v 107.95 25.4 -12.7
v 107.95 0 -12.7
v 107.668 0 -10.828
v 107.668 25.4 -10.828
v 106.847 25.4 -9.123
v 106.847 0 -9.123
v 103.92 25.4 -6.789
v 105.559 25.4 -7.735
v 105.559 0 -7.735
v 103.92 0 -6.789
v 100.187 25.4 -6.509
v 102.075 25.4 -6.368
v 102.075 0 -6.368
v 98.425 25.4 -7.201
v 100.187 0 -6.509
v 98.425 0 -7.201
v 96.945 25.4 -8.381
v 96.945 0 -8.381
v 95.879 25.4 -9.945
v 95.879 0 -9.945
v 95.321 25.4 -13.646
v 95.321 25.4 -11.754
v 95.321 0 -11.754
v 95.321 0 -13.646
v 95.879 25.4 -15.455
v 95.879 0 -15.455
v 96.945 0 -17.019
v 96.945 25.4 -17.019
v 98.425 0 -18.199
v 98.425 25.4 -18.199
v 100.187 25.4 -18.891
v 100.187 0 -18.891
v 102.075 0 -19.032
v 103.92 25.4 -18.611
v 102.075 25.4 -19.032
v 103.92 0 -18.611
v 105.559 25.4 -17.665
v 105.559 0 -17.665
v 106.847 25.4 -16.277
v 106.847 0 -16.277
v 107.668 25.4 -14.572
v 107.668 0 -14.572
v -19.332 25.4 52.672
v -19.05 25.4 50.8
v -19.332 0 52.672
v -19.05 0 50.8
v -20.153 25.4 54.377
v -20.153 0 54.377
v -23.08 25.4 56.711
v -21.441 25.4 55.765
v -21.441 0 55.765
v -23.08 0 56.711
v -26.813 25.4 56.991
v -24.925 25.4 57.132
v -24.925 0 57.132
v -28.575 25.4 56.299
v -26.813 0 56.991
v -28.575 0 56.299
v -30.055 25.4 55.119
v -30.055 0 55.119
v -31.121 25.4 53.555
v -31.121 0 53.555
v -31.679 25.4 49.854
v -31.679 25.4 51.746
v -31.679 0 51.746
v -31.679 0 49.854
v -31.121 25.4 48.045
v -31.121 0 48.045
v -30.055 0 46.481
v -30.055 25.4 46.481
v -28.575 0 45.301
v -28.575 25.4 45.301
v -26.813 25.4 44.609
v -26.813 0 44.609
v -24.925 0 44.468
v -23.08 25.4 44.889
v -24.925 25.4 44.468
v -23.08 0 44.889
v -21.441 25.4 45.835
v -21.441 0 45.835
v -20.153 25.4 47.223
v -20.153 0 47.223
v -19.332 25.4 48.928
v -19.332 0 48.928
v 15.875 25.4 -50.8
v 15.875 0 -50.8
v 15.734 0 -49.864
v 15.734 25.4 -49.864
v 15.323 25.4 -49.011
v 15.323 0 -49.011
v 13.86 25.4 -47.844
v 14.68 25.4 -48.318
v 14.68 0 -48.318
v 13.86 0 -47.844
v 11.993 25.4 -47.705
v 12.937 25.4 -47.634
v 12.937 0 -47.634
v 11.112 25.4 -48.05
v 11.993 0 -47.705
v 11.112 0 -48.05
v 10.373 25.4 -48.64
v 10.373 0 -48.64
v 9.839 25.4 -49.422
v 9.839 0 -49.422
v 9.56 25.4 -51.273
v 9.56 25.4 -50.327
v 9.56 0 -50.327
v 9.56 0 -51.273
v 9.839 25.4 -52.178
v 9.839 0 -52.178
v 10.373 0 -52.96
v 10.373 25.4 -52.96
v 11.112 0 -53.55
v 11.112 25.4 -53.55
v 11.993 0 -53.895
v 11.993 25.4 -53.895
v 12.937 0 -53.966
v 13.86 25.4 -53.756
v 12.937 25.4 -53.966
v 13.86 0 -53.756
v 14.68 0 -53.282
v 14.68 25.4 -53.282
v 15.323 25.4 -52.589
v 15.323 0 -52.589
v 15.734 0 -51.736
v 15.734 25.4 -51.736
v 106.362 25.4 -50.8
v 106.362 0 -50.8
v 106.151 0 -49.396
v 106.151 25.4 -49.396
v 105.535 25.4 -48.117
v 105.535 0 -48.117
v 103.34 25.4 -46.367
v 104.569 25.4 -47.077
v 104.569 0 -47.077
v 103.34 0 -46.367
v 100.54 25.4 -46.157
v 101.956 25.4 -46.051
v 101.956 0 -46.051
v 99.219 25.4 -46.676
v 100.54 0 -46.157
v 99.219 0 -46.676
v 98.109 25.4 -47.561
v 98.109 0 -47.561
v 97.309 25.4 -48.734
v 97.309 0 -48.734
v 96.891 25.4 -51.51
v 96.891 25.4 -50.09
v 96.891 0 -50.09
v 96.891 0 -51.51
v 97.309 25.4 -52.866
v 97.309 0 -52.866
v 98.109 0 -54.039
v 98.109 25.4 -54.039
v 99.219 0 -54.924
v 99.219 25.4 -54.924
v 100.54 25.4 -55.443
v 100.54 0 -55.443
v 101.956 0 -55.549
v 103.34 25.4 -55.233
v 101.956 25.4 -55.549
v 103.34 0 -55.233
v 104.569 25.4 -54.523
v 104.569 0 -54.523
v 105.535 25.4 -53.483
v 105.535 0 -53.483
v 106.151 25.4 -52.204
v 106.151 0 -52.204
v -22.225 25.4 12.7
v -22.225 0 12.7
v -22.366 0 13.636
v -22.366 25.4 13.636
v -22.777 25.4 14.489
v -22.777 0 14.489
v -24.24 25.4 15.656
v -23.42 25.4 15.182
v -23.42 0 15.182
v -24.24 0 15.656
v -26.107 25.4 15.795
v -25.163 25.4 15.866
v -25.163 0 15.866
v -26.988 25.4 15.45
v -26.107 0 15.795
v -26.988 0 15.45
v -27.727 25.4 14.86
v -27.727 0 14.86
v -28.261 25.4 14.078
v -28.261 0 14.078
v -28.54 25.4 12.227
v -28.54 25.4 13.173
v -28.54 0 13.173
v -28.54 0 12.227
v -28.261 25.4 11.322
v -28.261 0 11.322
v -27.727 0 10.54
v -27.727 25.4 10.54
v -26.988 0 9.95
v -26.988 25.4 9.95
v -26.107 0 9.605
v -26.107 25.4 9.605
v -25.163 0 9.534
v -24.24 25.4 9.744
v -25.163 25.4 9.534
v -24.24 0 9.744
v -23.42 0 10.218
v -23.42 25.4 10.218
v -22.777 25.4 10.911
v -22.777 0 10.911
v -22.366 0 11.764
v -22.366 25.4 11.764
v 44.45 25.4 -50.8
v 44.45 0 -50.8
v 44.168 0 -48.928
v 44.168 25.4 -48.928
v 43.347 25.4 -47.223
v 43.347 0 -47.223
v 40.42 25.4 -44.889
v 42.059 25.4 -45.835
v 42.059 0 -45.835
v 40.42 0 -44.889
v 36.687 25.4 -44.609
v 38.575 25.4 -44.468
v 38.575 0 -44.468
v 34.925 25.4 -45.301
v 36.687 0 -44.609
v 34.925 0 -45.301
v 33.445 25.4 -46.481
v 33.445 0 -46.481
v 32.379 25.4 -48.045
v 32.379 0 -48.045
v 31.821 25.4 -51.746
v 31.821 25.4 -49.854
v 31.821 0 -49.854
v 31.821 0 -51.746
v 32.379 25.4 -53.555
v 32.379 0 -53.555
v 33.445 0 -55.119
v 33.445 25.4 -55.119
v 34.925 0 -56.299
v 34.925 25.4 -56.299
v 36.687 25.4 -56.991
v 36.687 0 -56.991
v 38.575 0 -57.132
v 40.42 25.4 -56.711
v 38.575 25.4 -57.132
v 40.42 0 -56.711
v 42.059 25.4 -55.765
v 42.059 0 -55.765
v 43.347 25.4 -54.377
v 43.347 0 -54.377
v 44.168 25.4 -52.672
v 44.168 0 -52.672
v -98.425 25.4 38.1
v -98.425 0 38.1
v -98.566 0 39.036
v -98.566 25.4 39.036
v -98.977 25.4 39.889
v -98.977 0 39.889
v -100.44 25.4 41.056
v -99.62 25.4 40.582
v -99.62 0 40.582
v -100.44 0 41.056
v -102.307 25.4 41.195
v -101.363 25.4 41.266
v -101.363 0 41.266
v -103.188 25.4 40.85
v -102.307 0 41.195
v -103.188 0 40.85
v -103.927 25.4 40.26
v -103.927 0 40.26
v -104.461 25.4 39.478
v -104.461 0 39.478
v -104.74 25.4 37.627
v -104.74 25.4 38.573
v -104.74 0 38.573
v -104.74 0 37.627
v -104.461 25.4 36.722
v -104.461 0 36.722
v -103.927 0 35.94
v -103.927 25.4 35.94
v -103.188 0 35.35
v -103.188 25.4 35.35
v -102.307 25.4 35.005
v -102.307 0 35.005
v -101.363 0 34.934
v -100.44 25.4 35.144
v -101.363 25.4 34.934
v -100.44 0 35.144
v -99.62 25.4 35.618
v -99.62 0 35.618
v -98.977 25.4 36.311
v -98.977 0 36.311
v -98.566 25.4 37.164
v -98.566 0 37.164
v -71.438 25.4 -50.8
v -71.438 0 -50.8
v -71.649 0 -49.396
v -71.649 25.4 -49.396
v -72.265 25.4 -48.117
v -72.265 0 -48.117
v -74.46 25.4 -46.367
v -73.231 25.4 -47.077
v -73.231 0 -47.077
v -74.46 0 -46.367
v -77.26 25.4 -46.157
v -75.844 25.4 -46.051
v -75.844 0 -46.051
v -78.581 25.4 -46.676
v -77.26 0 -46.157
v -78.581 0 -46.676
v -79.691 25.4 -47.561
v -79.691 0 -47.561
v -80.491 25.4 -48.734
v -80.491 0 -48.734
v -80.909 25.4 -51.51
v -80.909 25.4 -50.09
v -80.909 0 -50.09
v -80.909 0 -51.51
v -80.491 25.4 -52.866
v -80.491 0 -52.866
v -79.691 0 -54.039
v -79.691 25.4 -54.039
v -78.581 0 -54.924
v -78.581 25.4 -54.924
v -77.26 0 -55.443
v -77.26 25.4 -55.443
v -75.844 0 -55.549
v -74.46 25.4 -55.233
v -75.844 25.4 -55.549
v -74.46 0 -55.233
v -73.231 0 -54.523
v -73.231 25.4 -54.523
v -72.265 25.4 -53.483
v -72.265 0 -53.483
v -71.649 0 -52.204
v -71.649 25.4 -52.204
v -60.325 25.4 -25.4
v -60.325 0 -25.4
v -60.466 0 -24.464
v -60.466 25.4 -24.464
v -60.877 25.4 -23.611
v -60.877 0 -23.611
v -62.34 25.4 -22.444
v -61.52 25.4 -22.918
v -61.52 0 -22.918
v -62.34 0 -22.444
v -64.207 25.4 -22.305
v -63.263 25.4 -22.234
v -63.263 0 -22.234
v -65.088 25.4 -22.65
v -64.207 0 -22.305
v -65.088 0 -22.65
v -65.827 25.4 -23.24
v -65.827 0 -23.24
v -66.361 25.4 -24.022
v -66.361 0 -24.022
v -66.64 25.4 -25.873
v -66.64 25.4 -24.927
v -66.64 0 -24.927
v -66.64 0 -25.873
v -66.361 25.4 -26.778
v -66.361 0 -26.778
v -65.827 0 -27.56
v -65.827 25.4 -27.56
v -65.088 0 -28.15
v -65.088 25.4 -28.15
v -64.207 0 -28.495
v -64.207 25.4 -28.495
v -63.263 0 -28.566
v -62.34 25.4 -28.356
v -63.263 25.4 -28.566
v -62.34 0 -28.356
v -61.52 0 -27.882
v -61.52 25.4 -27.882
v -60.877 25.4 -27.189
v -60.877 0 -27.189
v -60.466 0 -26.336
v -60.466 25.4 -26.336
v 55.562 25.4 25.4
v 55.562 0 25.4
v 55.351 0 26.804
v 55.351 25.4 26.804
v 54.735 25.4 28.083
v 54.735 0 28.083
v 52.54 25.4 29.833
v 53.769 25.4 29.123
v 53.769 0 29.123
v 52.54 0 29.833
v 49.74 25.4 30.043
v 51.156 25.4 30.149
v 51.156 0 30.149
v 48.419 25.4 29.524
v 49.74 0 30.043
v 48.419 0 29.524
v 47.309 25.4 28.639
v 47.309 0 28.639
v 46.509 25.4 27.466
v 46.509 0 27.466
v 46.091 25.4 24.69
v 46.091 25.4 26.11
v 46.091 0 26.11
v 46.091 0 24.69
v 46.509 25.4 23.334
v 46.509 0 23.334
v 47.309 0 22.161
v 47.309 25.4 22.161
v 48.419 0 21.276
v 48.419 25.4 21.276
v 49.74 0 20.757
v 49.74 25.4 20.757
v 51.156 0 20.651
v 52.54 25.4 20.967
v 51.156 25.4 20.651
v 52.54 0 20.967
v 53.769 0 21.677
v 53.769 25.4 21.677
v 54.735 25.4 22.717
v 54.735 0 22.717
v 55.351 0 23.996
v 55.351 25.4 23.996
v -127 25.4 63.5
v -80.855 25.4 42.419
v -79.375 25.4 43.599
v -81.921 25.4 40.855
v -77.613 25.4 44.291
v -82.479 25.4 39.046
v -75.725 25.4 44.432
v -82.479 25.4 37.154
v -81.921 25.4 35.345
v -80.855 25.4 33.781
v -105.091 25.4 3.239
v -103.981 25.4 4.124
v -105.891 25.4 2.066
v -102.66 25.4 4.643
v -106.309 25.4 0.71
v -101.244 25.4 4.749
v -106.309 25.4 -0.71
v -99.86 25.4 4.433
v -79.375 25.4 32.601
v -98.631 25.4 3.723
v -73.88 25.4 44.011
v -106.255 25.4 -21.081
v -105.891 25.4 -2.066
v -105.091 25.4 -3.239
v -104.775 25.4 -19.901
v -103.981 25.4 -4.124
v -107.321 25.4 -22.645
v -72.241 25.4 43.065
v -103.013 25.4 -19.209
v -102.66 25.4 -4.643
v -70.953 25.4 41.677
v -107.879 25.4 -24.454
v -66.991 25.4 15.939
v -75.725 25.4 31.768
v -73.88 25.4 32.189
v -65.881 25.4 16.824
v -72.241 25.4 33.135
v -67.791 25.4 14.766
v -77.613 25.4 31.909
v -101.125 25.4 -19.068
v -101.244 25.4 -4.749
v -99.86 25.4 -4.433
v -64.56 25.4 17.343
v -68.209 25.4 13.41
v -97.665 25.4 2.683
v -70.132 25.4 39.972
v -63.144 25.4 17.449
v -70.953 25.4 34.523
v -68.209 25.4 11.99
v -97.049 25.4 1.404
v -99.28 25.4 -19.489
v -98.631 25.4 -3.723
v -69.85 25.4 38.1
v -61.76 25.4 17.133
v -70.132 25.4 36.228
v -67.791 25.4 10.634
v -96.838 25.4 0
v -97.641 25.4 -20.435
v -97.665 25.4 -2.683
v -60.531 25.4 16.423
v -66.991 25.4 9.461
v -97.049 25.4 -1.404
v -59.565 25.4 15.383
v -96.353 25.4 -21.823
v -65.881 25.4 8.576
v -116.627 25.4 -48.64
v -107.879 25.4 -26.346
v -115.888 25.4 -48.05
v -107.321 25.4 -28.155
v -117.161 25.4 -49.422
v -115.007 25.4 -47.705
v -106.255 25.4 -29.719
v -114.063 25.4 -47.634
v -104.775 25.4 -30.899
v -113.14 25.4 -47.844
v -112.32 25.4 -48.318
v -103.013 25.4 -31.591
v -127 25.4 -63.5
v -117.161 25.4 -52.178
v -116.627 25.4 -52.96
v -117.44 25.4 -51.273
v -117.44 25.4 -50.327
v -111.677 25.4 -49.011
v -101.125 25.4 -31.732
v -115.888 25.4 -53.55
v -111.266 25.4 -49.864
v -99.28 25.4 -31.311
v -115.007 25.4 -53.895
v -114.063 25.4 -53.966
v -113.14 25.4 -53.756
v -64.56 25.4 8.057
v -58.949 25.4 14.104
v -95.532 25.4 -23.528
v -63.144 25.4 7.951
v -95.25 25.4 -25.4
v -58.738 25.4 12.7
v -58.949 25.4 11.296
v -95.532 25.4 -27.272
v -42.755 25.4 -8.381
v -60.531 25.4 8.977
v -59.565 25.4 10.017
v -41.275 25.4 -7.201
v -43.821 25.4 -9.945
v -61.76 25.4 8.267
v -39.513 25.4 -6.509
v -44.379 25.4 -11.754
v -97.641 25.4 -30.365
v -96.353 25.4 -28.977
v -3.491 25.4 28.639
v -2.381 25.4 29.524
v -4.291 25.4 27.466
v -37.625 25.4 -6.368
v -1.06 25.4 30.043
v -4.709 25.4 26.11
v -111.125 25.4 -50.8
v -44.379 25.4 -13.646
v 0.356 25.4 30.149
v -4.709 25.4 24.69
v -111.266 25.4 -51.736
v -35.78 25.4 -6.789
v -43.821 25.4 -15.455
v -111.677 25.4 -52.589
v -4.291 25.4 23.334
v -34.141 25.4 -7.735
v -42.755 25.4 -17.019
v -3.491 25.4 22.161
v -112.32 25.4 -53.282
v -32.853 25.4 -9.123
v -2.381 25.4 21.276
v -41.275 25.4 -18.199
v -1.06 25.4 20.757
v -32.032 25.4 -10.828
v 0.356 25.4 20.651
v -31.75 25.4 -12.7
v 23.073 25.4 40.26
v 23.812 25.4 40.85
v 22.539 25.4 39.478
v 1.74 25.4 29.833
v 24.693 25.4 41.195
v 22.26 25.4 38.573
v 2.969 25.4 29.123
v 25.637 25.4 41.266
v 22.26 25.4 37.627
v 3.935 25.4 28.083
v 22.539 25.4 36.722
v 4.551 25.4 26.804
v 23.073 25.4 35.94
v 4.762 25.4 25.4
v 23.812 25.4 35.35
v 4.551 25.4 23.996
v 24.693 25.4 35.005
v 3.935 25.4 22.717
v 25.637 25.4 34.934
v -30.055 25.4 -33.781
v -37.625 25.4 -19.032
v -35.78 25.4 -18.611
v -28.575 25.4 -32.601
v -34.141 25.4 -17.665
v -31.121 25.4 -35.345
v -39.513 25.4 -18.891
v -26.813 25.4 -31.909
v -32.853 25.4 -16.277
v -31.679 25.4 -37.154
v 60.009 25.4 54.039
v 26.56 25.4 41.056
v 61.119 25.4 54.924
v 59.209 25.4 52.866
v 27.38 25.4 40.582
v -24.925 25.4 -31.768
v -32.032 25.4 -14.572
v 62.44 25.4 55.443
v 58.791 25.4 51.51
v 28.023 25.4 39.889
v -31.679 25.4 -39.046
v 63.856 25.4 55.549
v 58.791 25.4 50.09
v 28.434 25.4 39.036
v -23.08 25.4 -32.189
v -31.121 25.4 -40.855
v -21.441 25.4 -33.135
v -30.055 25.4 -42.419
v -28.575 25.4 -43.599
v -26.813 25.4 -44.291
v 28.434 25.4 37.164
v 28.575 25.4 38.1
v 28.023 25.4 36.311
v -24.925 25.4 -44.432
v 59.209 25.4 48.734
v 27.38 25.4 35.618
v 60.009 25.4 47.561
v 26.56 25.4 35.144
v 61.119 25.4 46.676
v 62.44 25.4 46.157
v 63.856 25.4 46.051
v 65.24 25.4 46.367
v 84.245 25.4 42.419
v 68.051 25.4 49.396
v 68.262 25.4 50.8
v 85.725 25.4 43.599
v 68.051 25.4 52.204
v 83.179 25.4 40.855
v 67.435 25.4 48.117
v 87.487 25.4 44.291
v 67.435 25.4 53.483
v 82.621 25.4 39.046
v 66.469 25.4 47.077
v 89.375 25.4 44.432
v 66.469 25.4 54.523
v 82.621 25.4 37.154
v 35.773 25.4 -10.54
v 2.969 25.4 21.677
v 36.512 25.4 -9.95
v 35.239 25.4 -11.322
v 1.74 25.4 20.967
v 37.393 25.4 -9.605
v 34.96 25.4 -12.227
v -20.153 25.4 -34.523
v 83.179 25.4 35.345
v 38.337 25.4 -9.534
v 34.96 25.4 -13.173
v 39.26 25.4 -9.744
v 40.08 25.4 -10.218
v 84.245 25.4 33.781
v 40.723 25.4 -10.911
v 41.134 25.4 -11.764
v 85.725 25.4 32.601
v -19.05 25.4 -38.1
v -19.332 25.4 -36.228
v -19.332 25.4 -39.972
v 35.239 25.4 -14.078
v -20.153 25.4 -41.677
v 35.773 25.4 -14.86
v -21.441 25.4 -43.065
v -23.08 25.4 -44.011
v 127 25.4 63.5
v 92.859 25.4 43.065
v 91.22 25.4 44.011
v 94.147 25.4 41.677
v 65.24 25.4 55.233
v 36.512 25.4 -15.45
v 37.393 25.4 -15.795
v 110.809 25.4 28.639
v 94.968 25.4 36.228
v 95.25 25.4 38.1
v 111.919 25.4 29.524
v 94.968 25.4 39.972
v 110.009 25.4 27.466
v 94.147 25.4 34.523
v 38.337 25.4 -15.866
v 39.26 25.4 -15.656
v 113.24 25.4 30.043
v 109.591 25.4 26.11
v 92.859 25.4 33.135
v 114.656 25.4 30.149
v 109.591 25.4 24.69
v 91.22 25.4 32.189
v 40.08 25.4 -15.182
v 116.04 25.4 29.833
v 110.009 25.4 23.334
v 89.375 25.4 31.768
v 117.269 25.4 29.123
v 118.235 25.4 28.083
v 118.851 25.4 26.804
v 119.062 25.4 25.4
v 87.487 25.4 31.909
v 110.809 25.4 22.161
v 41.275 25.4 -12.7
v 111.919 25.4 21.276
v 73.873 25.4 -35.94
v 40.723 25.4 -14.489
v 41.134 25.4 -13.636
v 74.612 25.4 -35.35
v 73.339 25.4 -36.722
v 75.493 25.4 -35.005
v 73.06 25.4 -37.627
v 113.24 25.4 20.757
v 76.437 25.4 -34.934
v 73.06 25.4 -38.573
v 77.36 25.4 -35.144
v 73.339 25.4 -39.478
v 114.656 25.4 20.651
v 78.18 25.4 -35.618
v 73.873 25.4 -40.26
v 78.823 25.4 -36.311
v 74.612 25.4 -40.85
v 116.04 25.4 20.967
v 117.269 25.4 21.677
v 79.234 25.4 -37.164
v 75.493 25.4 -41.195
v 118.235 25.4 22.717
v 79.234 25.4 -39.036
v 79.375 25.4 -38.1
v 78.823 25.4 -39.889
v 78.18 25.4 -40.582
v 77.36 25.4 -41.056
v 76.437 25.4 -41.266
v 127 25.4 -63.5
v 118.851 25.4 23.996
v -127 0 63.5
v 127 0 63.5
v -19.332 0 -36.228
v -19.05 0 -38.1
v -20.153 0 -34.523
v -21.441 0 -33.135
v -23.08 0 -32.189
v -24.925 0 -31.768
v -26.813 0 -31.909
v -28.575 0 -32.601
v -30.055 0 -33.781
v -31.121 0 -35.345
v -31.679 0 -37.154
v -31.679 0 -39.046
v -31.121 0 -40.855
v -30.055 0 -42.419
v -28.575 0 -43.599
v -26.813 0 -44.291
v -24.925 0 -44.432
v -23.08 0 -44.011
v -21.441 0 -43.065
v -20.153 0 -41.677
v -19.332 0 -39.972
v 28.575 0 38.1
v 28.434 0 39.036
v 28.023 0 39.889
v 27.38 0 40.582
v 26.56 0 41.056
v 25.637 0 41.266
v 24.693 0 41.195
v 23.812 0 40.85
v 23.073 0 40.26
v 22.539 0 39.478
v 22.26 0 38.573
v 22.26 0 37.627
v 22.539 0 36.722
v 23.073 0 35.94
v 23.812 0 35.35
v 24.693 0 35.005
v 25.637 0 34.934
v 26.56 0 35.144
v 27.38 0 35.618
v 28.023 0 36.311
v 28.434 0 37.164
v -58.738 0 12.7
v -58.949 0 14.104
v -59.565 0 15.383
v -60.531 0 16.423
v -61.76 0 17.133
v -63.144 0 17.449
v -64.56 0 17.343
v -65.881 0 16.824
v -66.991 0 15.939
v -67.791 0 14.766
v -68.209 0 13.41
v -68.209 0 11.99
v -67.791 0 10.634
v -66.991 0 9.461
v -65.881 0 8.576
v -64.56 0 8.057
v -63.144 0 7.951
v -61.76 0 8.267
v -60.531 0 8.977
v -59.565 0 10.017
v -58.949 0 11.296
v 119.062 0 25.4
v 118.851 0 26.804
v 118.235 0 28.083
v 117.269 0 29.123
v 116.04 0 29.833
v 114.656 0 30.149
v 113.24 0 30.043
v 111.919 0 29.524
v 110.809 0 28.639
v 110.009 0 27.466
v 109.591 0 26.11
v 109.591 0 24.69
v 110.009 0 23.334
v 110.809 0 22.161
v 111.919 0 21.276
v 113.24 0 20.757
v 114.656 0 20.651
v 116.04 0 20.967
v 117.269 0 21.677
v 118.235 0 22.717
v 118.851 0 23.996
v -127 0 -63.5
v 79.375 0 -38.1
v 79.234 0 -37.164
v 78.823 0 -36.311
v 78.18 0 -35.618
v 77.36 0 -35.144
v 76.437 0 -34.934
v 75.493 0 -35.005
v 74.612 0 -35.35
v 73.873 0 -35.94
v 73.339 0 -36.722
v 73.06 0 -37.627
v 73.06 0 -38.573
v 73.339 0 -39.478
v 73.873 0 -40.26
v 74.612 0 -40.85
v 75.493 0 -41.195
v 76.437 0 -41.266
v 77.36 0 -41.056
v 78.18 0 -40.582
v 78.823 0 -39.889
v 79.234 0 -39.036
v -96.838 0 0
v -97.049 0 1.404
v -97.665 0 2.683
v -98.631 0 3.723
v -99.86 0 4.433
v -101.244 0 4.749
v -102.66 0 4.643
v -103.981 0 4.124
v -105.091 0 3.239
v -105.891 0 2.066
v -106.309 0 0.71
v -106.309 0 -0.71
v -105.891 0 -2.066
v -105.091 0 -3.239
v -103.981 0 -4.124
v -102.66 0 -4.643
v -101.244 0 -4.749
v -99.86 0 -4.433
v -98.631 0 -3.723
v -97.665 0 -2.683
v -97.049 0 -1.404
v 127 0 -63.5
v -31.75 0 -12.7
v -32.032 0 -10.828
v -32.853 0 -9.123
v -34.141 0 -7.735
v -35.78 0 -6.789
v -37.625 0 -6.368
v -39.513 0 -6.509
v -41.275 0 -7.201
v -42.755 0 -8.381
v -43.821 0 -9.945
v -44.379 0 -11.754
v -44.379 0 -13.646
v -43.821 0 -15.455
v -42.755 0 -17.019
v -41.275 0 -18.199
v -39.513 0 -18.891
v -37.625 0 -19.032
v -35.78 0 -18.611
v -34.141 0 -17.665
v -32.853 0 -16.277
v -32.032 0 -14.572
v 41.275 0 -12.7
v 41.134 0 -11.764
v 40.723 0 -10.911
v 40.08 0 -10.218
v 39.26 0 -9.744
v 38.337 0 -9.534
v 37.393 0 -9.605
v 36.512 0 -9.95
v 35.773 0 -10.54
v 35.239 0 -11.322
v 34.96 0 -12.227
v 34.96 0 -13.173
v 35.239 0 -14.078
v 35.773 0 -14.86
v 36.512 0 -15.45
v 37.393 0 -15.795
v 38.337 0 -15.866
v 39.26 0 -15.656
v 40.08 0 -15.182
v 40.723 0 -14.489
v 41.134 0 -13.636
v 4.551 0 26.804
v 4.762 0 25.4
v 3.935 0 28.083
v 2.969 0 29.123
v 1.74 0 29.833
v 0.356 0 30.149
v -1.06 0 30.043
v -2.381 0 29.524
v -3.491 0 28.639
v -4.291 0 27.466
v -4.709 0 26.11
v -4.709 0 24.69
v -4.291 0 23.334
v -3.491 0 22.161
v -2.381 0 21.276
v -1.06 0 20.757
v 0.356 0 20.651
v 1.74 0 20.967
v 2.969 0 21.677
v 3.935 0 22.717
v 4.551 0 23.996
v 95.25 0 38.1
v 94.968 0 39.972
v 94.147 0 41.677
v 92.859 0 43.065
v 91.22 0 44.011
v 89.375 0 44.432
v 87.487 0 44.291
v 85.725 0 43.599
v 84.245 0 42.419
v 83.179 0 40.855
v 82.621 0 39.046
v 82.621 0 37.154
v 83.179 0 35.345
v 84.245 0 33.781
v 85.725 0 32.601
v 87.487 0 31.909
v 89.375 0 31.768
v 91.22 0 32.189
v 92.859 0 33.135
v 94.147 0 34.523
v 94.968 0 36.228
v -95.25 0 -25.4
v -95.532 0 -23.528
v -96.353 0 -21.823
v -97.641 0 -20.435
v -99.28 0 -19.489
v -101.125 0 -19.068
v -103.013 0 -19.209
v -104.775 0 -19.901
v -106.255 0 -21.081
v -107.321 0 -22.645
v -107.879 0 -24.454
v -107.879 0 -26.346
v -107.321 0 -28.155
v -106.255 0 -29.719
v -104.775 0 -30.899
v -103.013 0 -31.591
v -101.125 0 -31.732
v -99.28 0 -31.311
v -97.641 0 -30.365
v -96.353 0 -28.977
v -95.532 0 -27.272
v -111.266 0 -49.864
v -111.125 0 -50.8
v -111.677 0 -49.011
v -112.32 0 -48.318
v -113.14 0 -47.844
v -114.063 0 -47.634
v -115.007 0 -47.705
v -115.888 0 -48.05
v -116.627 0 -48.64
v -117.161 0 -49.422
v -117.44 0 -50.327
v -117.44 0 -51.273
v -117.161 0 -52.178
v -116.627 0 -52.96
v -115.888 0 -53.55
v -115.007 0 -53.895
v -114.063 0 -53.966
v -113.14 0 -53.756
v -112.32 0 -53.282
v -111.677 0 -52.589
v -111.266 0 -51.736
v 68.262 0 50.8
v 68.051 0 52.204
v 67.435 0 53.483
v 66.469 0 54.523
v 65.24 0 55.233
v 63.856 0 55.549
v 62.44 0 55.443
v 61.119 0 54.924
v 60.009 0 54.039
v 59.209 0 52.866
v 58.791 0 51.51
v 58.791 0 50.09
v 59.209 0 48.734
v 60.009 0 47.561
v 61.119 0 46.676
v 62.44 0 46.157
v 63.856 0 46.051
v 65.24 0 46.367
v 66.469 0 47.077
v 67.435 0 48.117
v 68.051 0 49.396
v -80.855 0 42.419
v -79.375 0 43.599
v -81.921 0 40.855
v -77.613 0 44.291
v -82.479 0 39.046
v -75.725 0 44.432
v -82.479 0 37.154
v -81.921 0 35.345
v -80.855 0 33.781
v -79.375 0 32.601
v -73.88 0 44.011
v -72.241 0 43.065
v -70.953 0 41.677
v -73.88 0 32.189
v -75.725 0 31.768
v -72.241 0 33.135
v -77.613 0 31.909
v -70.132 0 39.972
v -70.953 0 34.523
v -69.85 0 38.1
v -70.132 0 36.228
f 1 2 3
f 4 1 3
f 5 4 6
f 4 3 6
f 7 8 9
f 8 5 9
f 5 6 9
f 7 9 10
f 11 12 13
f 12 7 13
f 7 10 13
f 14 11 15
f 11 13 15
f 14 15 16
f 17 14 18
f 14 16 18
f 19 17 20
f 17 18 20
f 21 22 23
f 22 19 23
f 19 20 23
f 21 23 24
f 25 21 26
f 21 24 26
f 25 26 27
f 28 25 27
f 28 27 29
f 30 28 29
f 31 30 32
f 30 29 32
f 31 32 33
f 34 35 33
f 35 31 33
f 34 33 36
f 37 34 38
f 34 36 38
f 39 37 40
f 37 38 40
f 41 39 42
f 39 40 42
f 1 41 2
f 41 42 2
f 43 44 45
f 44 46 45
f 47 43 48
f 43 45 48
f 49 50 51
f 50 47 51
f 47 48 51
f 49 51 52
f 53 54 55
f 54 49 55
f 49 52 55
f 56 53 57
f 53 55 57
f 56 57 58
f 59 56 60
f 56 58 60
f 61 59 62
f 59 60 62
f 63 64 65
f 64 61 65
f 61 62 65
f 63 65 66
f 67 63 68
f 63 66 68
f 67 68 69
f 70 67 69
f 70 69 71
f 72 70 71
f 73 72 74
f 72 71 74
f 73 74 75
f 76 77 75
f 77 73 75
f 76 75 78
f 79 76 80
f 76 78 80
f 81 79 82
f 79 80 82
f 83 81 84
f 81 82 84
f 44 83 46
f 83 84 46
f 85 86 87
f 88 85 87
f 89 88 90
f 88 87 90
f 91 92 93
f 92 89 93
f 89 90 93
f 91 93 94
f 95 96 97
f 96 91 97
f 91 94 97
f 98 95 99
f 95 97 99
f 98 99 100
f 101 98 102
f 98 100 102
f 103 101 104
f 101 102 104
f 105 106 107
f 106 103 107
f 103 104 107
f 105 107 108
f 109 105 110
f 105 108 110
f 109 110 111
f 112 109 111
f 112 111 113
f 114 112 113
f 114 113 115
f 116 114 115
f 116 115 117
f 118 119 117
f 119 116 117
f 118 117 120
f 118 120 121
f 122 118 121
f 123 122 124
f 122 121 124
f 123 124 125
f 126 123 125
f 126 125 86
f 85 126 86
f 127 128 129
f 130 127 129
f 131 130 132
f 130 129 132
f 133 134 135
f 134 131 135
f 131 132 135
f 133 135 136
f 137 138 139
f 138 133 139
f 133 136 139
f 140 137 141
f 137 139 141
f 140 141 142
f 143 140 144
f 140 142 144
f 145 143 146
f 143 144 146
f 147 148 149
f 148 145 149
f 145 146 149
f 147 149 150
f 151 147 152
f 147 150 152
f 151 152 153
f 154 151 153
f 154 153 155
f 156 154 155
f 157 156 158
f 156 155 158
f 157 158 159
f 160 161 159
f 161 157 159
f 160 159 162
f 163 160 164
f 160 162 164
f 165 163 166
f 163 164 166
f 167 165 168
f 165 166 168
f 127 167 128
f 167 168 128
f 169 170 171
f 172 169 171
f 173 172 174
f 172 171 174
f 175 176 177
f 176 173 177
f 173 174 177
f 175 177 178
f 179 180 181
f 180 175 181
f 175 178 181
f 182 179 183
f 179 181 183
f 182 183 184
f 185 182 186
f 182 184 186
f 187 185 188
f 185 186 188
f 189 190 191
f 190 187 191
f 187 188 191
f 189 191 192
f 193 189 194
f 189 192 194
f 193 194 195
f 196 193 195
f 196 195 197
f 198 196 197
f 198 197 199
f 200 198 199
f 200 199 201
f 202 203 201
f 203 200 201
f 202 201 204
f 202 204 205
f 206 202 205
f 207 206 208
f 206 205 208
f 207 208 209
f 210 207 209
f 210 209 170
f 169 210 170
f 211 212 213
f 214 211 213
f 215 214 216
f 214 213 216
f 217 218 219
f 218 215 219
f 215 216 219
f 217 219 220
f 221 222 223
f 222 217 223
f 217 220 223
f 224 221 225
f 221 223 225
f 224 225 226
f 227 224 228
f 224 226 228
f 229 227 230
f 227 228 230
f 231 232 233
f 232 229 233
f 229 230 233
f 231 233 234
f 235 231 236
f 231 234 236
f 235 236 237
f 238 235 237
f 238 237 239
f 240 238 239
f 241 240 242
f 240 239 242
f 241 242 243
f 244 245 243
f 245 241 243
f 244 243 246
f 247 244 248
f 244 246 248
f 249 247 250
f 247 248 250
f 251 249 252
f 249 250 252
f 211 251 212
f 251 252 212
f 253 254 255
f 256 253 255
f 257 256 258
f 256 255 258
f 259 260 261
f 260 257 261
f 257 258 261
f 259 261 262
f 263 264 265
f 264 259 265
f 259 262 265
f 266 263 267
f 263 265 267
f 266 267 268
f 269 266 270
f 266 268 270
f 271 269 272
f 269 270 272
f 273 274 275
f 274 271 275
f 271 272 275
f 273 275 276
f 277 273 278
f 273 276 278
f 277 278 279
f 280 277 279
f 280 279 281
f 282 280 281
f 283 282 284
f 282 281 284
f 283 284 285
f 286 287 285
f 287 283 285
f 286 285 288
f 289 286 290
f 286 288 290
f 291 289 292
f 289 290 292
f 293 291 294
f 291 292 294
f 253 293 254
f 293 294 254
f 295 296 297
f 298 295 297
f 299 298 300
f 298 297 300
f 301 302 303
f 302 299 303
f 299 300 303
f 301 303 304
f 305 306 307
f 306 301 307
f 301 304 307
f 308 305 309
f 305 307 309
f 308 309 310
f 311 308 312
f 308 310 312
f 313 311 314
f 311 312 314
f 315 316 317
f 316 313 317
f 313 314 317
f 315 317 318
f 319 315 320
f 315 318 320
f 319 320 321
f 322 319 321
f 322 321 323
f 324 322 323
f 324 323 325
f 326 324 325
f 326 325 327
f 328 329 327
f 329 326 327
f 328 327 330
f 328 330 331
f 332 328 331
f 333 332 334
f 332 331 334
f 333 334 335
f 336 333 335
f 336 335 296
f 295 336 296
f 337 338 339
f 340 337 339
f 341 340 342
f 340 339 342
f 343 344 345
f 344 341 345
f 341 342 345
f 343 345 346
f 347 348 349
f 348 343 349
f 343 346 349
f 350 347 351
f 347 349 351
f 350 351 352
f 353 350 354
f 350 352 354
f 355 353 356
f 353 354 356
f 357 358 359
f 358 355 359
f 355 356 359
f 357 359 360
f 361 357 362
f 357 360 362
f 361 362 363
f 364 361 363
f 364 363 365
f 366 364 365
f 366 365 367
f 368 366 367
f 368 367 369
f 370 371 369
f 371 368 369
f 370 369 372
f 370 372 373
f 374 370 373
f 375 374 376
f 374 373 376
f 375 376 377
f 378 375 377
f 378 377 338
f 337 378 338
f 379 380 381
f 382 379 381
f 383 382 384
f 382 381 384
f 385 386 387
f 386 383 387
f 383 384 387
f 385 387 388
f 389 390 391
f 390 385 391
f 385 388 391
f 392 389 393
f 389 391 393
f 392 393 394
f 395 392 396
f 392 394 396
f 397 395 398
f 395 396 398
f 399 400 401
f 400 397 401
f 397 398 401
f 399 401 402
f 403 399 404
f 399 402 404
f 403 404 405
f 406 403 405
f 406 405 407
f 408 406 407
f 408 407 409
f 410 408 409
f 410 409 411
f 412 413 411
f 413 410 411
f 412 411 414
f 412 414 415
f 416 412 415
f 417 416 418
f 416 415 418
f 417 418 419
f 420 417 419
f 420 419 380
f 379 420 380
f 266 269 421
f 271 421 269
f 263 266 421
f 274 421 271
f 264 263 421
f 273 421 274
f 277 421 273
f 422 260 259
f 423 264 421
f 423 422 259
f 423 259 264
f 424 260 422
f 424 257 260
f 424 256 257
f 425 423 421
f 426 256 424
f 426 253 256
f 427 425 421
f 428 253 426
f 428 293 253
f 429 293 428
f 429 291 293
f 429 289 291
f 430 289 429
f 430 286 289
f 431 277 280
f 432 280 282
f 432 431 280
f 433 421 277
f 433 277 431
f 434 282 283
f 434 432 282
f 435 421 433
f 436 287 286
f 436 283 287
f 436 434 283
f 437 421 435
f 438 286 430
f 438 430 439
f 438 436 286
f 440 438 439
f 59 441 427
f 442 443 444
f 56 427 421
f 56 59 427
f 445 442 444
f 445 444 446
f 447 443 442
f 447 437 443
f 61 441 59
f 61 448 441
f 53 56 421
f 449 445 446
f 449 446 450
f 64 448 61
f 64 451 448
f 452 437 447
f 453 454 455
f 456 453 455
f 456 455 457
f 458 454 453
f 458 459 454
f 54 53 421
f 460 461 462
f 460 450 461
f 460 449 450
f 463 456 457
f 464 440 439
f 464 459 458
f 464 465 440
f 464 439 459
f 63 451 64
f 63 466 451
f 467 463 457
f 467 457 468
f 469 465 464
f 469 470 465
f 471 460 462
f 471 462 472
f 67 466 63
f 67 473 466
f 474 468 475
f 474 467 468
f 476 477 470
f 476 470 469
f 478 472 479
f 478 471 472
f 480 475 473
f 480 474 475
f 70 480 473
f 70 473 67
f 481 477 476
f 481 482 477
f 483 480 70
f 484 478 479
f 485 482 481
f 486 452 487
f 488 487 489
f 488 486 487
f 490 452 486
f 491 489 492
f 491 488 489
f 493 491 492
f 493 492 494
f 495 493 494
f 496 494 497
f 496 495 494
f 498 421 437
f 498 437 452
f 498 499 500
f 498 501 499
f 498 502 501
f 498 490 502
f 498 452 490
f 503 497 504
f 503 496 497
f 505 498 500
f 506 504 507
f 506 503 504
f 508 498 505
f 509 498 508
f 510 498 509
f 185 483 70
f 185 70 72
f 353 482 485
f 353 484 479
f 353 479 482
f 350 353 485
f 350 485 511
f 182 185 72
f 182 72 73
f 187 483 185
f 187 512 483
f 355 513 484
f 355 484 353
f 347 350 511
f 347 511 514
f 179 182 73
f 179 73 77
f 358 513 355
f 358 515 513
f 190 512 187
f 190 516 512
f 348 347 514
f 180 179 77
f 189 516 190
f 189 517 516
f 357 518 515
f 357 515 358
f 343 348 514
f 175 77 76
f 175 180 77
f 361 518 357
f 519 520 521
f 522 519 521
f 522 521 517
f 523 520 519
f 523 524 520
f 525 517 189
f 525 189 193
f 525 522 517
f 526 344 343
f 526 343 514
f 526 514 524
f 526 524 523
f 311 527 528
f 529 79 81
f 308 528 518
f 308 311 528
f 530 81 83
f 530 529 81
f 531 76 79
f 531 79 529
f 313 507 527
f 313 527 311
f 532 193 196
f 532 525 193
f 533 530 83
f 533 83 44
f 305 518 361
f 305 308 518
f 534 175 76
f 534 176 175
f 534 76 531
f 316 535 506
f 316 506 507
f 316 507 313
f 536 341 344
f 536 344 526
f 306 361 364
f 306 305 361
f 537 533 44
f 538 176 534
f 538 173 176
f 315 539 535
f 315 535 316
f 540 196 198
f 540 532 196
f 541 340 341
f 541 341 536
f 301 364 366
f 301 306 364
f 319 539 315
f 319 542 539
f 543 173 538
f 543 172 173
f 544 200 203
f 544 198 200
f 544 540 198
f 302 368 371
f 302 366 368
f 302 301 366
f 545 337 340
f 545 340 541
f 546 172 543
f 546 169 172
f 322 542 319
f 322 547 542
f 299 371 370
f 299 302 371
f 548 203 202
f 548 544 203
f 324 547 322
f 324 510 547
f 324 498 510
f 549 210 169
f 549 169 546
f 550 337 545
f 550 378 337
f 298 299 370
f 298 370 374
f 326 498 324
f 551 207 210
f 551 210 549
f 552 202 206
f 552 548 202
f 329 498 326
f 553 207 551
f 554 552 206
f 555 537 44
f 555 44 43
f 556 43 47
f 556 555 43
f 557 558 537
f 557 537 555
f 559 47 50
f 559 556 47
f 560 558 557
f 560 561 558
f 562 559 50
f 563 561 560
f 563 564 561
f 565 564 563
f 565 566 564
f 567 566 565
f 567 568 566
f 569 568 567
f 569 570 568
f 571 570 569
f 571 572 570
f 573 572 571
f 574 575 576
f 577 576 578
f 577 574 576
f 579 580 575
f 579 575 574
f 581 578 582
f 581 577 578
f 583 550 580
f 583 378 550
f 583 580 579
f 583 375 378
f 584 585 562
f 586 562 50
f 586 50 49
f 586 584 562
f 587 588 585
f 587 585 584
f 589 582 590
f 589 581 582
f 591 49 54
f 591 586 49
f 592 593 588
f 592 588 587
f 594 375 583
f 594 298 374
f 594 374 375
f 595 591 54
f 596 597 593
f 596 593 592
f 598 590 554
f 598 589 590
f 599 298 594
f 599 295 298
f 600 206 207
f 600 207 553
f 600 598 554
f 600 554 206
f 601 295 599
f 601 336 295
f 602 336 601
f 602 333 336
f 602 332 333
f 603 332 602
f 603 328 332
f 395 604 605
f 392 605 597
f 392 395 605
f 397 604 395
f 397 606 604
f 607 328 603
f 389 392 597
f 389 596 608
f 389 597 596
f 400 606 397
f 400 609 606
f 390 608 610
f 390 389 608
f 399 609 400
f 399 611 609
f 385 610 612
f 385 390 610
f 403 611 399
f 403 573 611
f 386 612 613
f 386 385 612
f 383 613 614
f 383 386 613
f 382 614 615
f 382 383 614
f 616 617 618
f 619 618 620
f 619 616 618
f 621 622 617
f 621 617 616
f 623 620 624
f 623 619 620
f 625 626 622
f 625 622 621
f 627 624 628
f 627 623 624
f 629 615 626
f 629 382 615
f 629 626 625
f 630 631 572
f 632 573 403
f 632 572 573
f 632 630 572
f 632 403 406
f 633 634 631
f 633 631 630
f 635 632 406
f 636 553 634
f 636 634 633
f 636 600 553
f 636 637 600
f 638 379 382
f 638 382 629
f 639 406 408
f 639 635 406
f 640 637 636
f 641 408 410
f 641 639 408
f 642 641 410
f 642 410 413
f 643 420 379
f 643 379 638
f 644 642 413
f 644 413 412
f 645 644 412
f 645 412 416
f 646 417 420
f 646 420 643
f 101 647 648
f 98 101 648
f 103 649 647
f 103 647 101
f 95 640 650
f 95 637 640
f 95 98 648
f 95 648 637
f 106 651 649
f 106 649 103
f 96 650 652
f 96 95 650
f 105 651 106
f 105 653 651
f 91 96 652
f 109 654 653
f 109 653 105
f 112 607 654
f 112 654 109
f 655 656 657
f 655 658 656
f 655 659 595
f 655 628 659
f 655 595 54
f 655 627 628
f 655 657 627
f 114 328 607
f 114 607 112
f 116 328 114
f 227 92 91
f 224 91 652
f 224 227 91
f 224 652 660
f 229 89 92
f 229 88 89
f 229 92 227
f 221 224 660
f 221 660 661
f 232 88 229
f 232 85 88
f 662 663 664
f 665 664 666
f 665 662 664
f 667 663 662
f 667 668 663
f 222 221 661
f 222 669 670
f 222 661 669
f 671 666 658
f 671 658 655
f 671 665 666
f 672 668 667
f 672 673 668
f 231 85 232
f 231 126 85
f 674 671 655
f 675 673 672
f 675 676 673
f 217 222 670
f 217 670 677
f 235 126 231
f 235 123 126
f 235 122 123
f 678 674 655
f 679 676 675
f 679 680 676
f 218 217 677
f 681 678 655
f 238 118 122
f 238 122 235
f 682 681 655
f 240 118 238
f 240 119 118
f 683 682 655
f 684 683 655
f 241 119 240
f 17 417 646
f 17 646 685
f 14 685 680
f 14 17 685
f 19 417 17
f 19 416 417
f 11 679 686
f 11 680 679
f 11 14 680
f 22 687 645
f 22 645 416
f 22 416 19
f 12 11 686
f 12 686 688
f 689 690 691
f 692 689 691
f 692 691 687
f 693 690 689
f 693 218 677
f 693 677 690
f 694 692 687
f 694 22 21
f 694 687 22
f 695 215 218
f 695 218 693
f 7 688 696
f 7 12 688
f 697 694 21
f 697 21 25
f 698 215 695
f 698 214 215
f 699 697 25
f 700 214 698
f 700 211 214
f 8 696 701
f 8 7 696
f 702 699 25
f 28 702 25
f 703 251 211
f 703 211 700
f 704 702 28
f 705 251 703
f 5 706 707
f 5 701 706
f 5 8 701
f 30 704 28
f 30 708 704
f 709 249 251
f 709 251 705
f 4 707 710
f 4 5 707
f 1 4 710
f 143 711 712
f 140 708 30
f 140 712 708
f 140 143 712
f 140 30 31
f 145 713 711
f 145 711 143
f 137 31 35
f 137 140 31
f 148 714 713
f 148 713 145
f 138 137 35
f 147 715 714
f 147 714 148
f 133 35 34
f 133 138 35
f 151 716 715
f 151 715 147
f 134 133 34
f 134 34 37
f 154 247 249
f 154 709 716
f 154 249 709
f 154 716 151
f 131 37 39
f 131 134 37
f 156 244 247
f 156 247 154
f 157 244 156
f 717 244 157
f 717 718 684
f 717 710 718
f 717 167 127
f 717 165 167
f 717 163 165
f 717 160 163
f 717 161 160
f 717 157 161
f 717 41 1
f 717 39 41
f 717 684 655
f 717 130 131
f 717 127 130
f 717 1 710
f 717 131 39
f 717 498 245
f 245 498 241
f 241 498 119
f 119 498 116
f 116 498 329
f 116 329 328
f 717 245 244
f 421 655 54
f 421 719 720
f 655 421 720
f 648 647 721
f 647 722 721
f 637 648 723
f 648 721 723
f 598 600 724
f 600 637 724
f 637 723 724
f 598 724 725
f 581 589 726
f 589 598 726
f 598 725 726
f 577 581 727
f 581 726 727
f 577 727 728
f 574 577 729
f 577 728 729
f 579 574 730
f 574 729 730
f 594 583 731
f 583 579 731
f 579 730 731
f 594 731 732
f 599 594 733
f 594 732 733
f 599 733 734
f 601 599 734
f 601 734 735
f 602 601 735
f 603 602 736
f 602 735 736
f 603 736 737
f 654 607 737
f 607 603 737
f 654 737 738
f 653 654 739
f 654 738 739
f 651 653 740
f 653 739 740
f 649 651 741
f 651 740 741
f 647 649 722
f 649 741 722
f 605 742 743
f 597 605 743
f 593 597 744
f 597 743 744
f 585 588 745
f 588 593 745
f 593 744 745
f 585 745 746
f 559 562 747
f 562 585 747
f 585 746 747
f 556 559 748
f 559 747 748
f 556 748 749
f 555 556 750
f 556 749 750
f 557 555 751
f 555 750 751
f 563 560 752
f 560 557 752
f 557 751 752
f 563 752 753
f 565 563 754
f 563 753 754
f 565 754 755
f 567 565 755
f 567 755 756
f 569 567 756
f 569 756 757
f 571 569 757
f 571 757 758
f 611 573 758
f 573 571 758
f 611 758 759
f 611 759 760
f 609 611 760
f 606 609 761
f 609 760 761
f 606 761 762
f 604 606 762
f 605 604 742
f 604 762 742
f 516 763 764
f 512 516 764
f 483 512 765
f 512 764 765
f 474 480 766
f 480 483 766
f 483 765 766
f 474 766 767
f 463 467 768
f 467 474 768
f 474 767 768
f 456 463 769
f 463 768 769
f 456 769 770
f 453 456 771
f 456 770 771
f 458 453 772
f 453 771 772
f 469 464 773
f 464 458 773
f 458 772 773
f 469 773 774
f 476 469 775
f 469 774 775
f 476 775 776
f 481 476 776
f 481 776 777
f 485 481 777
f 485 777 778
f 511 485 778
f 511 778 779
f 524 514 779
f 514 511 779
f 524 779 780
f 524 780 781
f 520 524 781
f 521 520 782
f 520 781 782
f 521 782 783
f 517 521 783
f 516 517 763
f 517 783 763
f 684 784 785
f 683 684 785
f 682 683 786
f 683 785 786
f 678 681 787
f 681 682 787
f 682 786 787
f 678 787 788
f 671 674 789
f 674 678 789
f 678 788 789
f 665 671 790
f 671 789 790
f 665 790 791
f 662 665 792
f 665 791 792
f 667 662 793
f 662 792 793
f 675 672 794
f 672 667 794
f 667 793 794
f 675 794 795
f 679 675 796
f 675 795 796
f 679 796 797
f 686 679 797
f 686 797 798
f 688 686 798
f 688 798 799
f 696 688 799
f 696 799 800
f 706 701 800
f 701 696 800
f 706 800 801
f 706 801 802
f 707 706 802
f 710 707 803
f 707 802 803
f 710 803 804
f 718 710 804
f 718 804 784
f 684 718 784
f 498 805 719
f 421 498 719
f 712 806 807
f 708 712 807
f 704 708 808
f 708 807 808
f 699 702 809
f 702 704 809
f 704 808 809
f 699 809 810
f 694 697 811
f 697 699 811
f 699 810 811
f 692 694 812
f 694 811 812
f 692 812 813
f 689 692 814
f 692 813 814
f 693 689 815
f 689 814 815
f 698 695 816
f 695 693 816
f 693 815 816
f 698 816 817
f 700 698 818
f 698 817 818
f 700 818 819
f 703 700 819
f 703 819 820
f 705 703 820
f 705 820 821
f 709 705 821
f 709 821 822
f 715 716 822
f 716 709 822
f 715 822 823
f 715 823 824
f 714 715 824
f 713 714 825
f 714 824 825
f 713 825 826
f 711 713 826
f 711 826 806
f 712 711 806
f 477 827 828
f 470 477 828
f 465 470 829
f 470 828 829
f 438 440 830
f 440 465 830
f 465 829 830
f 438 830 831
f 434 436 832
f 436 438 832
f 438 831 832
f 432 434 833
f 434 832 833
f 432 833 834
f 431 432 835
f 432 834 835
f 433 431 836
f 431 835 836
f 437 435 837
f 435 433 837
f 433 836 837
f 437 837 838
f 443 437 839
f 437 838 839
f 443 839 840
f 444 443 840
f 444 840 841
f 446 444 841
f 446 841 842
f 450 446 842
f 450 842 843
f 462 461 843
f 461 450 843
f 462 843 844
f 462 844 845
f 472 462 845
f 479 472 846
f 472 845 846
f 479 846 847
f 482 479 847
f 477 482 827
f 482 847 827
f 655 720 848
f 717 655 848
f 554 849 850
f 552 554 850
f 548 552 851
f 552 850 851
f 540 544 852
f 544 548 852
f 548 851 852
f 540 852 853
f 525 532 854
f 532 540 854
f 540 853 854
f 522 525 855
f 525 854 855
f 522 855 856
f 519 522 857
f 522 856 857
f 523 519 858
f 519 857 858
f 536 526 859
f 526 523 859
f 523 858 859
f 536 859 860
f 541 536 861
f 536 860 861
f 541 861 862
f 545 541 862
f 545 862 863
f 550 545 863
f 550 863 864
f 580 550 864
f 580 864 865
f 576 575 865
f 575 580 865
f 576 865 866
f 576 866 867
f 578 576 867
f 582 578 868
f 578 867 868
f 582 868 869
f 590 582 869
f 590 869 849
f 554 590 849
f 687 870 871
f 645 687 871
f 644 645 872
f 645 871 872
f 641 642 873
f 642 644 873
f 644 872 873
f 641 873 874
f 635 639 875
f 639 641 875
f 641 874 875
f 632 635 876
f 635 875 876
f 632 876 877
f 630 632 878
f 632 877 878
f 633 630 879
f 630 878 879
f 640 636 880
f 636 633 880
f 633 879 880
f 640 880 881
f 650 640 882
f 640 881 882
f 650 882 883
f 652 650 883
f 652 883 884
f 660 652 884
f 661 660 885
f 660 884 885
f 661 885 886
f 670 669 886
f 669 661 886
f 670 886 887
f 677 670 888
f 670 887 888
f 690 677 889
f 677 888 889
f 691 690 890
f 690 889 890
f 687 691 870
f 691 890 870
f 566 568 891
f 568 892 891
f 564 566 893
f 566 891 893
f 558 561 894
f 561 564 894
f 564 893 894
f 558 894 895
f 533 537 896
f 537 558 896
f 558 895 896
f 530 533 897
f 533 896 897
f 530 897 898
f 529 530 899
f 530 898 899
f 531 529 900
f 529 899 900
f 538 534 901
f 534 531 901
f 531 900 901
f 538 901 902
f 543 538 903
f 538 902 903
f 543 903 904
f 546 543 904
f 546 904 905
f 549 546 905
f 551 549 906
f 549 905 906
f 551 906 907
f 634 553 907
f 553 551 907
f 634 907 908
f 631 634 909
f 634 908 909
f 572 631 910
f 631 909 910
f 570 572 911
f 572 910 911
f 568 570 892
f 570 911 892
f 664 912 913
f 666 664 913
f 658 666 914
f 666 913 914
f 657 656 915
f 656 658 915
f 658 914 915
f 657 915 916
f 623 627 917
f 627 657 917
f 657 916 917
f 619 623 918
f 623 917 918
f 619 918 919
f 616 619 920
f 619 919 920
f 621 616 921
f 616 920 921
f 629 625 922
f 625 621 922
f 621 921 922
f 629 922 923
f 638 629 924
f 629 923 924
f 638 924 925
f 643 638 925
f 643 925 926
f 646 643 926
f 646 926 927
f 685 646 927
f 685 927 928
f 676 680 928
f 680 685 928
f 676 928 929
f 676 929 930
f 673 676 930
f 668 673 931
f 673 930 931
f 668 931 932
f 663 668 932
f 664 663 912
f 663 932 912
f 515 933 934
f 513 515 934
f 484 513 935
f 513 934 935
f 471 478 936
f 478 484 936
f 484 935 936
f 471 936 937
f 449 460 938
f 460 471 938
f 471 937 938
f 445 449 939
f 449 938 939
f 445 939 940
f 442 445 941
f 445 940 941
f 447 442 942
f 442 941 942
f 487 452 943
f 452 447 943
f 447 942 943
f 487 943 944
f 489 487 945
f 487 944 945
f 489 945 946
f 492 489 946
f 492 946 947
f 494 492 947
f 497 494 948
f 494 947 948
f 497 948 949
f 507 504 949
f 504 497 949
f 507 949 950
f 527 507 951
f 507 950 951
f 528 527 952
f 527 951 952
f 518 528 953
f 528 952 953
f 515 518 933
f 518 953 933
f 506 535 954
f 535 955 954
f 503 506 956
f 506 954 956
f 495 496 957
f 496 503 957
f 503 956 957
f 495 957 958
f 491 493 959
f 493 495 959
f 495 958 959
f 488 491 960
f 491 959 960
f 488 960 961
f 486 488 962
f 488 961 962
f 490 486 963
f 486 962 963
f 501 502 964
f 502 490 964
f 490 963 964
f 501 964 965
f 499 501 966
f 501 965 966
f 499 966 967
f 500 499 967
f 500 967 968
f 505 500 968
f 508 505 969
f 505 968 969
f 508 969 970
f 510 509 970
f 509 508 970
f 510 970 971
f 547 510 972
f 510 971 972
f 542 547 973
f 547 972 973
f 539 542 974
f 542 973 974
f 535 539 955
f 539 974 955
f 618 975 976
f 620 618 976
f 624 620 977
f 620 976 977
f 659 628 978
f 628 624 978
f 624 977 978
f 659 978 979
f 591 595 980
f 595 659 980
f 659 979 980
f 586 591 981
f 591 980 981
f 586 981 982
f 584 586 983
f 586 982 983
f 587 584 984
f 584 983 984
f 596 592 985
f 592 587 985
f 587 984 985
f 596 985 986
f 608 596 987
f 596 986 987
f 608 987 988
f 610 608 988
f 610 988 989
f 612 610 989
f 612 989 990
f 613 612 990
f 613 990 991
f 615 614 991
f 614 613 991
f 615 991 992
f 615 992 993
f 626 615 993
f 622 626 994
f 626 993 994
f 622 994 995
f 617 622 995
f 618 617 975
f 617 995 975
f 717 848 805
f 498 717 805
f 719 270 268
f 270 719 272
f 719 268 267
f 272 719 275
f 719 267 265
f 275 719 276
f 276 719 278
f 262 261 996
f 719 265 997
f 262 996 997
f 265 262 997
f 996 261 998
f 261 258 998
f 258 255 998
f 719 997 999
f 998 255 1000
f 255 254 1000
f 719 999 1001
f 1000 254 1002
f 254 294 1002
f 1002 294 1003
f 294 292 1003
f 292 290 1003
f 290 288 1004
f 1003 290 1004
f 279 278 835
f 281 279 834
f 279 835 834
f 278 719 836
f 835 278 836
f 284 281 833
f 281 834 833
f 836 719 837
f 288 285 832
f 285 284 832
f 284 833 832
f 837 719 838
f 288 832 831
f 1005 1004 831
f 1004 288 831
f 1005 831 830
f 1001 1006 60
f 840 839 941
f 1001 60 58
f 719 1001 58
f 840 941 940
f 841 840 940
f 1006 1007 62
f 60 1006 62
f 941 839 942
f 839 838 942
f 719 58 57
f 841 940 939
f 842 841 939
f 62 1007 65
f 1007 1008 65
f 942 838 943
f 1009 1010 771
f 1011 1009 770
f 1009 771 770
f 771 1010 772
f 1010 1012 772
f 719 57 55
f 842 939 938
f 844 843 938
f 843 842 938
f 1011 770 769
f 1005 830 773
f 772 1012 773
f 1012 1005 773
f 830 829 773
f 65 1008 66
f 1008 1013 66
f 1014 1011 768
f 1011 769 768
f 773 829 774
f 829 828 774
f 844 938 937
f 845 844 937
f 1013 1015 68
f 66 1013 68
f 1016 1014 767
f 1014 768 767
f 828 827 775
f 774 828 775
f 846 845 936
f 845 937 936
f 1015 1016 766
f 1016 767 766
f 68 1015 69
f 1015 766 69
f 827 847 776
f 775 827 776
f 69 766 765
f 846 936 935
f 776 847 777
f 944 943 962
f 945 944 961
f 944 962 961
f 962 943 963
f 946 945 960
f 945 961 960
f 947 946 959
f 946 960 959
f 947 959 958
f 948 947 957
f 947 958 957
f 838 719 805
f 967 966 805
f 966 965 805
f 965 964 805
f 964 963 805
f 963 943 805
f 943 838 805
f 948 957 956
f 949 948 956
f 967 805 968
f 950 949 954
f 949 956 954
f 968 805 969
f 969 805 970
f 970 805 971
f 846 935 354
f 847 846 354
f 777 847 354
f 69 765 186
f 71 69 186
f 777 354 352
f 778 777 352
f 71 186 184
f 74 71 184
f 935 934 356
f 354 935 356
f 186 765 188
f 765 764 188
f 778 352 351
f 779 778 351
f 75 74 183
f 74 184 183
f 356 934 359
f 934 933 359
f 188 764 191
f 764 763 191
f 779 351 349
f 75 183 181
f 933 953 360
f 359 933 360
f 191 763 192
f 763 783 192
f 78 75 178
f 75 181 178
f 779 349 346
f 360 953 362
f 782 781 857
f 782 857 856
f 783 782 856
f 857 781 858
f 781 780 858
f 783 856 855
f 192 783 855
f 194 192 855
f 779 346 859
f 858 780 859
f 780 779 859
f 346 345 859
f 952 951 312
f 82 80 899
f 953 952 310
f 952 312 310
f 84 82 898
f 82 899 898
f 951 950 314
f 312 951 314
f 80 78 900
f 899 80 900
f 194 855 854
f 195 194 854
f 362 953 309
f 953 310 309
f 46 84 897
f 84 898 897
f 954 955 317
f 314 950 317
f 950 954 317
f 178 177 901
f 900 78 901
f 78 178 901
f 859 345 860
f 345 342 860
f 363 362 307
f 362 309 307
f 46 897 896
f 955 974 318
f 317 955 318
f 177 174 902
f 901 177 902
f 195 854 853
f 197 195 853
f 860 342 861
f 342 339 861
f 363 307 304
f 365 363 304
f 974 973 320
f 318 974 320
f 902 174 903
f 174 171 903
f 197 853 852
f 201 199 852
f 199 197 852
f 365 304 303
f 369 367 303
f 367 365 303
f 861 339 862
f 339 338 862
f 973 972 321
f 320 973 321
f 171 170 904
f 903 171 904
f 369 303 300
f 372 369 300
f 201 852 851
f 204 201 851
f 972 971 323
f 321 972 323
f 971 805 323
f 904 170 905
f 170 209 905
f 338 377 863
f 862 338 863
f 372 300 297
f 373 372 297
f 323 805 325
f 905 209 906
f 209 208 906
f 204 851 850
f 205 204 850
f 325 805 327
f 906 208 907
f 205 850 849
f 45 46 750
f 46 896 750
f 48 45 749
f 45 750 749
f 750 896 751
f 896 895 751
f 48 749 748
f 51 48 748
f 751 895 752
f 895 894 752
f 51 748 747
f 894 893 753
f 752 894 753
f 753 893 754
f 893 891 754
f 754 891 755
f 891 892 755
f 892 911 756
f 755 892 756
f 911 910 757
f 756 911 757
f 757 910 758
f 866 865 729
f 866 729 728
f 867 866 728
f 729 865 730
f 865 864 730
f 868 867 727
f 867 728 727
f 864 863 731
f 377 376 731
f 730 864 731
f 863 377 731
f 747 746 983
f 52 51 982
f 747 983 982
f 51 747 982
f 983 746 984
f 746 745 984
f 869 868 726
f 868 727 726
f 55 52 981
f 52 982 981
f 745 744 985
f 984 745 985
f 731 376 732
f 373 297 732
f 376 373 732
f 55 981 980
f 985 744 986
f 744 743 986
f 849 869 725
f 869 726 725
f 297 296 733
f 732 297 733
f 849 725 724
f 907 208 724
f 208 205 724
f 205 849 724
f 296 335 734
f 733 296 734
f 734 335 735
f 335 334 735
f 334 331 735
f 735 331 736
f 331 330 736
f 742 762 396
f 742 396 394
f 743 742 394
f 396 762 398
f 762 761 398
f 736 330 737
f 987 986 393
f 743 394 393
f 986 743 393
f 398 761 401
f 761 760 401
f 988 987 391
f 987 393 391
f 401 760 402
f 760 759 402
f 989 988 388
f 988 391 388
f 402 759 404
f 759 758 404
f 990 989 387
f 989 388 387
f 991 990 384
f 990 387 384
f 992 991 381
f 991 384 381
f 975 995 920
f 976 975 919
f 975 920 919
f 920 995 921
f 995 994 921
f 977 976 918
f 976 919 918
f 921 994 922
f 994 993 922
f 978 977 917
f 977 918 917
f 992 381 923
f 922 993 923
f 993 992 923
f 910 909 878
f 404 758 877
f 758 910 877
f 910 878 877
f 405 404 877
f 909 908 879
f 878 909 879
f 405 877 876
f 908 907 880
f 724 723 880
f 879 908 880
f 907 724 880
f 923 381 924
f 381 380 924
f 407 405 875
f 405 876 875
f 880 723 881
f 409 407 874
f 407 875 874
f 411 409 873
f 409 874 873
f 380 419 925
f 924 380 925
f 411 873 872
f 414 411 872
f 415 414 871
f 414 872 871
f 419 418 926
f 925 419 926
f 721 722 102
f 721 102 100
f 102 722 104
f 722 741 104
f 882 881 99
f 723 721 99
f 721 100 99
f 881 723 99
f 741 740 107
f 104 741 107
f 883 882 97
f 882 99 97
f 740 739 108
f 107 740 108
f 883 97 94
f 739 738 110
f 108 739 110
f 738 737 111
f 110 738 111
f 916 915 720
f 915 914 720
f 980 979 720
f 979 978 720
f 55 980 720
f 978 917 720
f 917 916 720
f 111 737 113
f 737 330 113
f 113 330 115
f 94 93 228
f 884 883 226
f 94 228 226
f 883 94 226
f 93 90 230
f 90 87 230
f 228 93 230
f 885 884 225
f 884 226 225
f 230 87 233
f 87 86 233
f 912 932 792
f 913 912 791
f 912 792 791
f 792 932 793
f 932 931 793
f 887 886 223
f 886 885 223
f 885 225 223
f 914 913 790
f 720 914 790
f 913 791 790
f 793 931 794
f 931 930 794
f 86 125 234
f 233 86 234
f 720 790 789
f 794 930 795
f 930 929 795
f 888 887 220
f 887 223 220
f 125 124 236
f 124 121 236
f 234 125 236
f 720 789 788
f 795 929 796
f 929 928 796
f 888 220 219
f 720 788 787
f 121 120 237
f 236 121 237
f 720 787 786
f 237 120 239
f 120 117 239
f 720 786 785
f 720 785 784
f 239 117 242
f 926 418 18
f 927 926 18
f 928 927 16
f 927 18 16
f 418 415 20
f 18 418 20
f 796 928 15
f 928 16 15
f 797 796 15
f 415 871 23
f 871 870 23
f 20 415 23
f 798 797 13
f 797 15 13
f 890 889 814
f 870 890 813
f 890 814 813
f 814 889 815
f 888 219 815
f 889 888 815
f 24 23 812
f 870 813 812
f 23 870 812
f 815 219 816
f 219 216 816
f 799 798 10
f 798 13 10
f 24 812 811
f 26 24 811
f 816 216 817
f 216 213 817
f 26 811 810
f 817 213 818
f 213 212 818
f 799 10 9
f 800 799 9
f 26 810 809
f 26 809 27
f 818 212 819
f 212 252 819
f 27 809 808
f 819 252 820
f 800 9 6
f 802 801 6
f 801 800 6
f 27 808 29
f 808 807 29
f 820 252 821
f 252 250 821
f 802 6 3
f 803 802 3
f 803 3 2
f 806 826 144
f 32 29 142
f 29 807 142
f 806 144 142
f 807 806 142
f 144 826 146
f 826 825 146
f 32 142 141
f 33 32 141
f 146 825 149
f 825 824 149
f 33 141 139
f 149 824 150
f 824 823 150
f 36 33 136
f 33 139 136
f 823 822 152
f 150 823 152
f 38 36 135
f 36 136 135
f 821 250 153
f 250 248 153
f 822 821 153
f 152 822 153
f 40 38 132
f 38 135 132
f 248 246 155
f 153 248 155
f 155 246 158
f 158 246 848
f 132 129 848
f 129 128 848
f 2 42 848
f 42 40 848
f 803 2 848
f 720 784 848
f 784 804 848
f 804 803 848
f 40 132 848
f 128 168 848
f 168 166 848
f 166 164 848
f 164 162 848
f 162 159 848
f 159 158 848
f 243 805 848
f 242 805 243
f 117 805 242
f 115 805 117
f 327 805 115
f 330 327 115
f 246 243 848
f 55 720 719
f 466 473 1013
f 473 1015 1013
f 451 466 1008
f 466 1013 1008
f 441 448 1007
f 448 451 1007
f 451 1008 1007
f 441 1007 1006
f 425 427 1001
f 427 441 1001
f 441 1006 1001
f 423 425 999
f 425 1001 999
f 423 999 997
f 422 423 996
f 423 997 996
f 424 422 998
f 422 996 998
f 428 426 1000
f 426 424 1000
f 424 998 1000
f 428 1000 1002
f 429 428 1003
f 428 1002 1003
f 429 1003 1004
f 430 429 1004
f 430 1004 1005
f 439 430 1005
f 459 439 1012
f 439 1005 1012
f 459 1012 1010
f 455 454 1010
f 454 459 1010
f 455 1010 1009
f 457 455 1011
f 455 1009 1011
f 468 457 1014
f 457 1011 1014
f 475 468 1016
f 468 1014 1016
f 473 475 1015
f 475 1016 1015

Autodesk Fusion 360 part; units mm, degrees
sketch "Sketch1" plane through (0, 0, 0) normal (0, 1, 0) x (1, 0, 0)
  line L0 (-127, -63.5) -> (127, -63.5)
  line L1 (127, -63.5) -> (127, 63.5)
  line L2 (127, 63.5) -> (-127, 63.5)
  line L3 (-127, 63.5) -> (-127, -63.5)
  circle A0 centre (-101.6, -38.1) radius 3.175
  circle A1 centre (-114.3, 50.8) radius 3.175
  circle A2 centre (-63.5, 25.4) radius 3.175
  circle A3 centre (-25.4, -12.7) radius 3.175
  circle A4 centre (25.4, -38.1) radius 3.175
  circle A5 centre (38.1, 12.7) radius 3.175
  circle A6 centre (12.7, 50.8) radius 3.175
  circle A7 centre (76.2, 38.1) radius 3.175
  circle A8 centre (88.9, -38.1) radius 6.35
  circle A9 centre (101.6, 12.7) radius 6.35
  circle A10 centre (-25.4, 38.1) radius 6.35
  circle A11 centre (-38.1, 12.7) radius 6.35
  circle A12 centre (-76.2, -38.1) radius 6.35
  circle A13 centre (-101.6, 25.4) radius 6.35
  circle A14 centre (-25.4, -50.8) radius 6.35
  circle A15 centre (38.1, 50.8) radius 6.35
  circle A16 centre (50.8, -25.4) radius 4.7625
  circle A17 centre (-63.5, -12.7) radius 4.7625
  circle A18 centre (-101.6, 0) radius 4.7625
  circle A19 centre (-76.2, 50.8) radius 4.7625
  circle A20 centre (101.6, 50.8) radius 4.7625
  circle A21 centre (114.3, -25.4) radius 4.7625
  circle A22 centre (63.5, -50.8) radius 4.7625
  circle A23 centre (0, -25.4) radius 4.7625
  dimension "d1" = 6.35
  dimension "d2" = 6.35
  dimension "d3" = 6.35
  dimension "d4" = 6.35
  dimension "d5" = 12.7
  dimension "d6" = 12.7
  dimension "d7" = 9.525
  dimension "d8" = 9.525
extrude "Extrude1" add sketch "Sketch1" along normal blind 25.4
